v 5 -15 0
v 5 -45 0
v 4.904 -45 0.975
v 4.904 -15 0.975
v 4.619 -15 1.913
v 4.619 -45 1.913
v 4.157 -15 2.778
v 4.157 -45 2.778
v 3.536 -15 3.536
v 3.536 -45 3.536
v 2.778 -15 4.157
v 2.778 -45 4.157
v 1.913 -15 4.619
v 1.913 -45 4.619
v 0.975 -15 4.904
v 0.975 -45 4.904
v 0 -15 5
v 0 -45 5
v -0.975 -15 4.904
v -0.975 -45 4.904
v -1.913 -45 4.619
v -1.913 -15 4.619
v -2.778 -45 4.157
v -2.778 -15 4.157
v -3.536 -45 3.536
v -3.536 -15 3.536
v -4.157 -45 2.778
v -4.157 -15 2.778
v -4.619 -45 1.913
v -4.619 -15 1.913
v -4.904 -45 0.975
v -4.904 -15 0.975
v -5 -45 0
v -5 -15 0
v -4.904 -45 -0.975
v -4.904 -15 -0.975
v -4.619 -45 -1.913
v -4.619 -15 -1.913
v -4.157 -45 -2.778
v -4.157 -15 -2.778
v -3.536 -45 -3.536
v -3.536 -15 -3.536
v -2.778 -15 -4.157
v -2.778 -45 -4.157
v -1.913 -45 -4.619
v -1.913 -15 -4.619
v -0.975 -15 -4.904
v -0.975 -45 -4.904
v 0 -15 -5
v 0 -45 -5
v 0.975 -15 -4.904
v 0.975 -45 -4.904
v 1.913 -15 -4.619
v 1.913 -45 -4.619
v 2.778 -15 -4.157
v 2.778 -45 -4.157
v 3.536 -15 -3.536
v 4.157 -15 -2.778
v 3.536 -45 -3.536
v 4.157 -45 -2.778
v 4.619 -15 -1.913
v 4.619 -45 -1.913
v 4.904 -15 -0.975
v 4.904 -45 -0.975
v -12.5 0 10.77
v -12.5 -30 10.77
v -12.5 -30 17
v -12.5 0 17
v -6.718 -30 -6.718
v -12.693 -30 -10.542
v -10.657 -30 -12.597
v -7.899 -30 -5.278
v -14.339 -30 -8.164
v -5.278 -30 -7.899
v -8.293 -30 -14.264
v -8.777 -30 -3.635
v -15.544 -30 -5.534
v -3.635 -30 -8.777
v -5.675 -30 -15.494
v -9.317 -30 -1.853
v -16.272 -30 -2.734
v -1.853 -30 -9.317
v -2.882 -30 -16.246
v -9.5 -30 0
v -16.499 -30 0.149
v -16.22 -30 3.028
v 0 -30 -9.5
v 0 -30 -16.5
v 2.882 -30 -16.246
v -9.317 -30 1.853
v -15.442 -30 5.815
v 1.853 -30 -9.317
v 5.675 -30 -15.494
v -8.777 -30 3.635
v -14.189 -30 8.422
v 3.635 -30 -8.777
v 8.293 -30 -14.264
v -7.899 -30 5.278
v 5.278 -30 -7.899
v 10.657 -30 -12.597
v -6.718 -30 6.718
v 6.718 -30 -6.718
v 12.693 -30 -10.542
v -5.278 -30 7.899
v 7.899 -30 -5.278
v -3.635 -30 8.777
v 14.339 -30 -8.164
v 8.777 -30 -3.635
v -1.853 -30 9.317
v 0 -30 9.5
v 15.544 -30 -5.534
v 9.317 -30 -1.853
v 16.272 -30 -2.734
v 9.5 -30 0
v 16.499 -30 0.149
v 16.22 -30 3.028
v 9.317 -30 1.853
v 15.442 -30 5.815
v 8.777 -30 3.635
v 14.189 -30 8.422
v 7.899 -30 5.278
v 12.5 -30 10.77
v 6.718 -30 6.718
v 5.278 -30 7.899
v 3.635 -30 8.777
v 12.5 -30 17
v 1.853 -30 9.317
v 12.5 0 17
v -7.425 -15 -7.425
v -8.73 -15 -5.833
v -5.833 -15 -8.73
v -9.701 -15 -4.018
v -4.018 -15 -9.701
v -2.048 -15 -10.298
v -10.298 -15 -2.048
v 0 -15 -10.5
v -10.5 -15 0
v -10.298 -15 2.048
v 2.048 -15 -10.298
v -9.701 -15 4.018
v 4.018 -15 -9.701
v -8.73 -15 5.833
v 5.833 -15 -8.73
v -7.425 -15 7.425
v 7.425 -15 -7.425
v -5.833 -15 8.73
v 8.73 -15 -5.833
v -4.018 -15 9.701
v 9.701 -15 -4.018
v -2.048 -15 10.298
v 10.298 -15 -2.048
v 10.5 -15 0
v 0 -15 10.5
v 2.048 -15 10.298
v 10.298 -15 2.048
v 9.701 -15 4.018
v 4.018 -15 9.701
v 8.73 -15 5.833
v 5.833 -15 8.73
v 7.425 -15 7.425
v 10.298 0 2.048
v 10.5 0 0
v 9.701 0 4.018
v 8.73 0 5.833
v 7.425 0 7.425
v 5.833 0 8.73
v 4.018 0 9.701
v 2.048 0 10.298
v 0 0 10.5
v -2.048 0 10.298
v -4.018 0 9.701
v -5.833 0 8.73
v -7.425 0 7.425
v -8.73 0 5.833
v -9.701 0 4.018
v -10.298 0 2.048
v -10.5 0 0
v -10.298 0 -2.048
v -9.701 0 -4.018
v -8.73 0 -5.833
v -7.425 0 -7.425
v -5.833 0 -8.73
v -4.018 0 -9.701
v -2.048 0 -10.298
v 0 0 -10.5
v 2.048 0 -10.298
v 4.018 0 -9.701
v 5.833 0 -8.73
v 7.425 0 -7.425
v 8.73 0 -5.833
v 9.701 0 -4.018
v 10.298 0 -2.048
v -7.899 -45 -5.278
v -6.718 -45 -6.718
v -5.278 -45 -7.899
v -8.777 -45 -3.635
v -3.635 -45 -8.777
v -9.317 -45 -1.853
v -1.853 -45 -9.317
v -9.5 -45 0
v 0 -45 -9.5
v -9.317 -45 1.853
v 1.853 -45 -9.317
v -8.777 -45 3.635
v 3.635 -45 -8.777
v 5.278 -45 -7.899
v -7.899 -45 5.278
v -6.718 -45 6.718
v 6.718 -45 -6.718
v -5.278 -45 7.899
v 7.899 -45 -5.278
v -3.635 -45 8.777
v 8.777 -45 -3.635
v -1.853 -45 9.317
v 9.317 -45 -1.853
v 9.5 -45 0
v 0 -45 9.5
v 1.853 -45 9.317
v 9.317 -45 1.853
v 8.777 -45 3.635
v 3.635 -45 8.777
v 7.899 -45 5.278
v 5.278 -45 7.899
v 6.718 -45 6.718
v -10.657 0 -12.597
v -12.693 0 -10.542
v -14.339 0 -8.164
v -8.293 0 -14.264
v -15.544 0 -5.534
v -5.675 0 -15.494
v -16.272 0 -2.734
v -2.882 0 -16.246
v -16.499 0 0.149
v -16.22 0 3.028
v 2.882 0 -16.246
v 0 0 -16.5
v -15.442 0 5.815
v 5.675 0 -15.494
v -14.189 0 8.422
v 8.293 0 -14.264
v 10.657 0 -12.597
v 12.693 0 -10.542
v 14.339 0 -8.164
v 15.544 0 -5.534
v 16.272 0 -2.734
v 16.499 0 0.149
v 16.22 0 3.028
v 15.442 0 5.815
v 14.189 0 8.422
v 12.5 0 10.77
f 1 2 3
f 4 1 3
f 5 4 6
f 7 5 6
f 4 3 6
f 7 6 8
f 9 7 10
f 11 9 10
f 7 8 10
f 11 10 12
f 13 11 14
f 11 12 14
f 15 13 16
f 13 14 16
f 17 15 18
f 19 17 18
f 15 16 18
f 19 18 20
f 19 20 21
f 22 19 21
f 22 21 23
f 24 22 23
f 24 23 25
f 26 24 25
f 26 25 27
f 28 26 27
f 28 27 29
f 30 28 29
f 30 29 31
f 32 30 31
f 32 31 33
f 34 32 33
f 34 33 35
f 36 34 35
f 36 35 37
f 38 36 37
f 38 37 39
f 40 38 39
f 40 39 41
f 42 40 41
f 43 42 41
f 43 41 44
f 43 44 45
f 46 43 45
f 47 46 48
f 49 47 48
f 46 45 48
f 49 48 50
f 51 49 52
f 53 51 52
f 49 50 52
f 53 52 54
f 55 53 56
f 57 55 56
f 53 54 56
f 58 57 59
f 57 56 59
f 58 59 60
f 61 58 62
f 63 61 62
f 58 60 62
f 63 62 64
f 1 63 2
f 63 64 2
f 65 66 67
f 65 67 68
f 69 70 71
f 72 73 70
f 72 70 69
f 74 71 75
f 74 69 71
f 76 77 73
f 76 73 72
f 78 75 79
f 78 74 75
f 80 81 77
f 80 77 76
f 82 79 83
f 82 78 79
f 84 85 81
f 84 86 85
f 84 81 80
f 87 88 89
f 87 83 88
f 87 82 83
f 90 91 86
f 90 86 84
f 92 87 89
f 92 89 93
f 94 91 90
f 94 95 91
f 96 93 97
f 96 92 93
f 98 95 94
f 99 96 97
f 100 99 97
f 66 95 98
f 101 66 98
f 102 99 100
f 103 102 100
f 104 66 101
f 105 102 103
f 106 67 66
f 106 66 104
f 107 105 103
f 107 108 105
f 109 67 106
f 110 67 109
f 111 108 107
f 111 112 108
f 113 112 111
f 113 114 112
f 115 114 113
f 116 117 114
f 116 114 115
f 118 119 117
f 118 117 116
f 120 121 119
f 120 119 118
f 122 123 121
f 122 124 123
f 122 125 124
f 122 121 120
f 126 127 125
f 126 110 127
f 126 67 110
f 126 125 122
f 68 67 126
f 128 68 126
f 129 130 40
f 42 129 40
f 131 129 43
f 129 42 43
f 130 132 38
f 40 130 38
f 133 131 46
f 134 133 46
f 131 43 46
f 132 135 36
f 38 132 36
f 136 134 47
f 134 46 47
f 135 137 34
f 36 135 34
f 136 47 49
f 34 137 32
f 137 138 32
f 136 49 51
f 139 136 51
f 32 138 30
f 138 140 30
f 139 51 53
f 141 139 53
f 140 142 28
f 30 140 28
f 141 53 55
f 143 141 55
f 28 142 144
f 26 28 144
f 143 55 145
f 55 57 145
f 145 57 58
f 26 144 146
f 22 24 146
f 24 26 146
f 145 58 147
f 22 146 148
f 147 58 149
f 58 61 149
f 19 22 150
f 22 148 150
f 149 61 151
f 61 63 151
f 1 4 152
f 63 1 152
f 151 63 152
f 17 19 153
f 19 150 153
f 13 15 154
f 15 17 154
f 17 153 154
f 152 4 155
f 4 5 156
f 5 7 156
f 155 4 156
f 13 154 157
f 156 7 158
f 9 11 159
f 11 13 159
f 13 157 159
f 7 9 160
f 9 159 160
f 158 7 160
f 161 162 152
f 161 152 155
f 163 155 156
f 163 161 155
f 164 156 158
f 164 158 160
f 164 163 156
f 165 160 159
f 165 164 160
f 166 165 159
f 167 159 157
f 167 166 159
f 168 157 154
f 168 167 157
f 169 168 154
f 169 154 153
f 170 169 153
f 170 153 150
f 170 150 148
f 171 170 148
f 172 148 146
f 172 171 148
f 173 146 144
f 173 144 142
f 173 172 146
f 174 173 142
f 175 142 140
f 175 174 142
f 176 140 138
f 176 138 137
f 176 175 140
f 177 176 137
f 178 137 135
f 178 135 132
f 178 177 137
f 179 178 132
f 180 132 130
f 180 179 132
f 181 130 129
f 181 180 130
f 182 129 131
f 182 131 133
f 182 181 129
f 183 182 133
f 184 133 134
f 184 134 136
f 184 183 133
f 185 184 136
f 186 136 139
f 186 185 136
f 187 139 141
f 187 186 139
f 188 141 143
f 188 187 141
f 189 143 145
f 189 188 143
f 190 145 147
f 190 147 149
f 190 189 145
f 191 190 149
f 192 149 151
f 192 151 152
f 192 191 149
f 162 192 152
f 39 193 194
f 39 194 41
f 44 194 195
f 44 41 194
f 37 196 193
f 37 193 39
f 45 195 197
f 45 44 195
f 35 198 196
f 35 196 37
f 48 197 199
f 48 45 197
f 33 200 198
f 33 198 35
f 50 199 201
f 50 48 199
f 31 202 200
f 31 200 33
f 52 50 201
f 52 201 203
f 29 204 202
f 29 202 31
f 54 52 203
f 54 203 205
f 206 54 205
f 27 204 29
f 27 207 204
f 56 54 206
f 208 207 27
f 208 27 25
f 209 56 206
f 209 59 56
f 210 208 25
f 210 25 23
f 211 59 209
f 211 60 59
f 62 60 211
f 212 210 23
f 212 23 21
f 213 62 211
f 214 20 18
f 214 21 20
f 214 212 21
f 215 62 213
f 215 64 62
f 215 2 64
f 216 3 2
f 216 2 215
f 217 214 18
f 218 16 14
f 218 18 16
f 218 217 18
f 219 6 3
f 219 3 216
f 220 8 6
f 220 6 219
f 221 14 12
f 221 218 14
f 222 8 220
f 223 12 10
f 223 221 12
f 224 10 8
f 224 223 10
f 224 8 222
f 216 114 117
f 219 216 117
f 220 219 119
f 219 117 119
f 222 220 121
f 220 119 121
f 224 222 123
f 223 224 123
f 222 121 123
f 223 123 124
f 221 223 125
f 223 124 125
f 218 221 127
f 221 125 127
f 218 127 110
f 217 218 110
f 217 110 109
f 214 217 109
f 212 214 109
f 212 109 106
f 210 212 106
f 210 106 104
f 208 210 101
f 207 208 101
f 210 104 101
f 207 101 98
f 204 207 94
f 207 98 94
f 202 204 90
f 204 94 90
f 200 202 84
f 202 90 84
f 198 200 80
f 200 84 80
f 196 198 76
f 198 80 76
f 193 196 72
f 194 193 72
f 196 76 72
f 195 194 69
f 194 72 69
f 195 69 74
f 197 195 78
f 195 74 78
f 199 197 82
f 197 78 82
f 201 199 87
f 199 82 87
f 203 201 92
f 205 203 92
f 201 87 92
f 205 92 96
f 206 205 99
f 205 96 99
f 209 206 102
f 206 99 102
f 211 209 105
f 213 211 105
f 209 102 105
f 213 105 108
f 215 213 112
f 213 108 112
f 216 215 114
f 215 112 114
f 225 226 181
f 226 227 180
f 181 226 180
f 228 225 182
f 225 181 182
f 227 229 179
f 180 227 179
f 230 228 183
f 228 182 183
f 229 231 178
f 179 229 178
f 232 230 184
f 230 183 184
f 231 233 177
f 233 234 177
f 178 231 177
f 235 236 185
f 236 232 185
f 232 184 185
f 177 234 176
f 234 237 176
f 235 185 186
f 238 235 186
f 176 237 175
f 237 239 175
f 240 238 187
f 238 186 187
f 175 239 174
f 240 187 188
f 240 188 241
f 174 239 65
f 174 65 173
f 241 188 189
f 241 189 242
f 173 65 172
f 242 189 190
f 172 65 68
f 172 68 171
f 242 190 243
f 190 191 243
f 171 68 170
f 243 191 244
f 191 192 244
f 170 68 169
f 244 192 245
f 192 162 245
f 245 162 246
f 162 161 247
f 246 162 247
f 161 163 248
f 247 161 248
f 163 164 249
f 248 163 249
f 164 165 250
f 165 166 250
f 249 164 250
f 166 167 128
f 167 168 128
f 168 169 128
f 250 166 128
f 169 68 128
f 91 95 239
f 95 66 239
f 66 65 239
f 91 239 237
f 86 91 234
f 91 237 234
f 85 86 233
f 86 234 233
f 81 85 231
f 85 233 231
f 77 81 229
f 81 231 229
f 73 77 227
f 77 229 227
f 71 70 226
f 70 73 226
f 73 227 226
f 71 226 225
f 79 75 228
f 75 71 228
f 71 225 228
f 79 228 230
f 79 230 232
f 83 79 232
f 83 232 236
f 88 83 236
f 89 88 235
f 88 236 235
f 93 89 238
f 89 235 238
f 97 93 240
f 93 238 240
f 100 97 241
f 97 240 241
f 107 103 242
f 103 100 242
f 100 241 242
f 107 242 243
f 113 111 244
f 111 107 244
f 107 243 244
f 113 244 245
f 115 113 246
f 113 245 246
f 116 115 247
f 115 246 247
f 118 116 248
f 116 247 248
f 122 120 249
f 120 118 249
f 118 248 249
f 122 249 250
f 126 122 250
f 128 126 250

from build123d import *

# Parameters (mm, degrees)
F0_R     = 16.5
F1_DEPTH = 30
F2_W     = 12.5
F2_H     = 30
F3_DEPTH = 17
F4_R     = 9.5
F5_DEPTH = 15
F6_R     = 10.5
F7_DEPTH = 15
F8_R     = 5
F9_DEPTH = 77


with BuildPart() as f1:
    # F0 (on Front) → F1 (new body)
    with BuildSketch(Plane.XZ):
        Circle(F0_R)
    extrude(amount=F1_DEPTH)

    # F2 (on Top) → F3 (join)
    with BuildSketch(Plane.XY):
        with Locations((6.25, -15)):
            Rectangle(F2_W, F2_H)
        with Locations((-6.25, -15)):
            Rectangle(F2_W, F2_H)
    extrude(amount=F3_DEPTH)

    # F4 (on face) → F5 (join)
    with BuildSketch(Plane.XZ.offset(30)):
        Circle(F4_R)
    extrude(amount=F5_DEPTH)

    # F6 (on Front) → F7 (cut)
    with BuildSketch(Plane.XZ):
        Circle(F6_R)
    extrude(amount=F7_DEPTH, mode=Mode.SUBTRACT)

    # F8 (on face) → F9 (cut)
    with BuildSketch(Plane.XZ.offset(45)):
        Circle(F8_R)
    extrude(amount=-F9_DEPTH, mode=Mode.SUBTRACT)


solid = f1.part
